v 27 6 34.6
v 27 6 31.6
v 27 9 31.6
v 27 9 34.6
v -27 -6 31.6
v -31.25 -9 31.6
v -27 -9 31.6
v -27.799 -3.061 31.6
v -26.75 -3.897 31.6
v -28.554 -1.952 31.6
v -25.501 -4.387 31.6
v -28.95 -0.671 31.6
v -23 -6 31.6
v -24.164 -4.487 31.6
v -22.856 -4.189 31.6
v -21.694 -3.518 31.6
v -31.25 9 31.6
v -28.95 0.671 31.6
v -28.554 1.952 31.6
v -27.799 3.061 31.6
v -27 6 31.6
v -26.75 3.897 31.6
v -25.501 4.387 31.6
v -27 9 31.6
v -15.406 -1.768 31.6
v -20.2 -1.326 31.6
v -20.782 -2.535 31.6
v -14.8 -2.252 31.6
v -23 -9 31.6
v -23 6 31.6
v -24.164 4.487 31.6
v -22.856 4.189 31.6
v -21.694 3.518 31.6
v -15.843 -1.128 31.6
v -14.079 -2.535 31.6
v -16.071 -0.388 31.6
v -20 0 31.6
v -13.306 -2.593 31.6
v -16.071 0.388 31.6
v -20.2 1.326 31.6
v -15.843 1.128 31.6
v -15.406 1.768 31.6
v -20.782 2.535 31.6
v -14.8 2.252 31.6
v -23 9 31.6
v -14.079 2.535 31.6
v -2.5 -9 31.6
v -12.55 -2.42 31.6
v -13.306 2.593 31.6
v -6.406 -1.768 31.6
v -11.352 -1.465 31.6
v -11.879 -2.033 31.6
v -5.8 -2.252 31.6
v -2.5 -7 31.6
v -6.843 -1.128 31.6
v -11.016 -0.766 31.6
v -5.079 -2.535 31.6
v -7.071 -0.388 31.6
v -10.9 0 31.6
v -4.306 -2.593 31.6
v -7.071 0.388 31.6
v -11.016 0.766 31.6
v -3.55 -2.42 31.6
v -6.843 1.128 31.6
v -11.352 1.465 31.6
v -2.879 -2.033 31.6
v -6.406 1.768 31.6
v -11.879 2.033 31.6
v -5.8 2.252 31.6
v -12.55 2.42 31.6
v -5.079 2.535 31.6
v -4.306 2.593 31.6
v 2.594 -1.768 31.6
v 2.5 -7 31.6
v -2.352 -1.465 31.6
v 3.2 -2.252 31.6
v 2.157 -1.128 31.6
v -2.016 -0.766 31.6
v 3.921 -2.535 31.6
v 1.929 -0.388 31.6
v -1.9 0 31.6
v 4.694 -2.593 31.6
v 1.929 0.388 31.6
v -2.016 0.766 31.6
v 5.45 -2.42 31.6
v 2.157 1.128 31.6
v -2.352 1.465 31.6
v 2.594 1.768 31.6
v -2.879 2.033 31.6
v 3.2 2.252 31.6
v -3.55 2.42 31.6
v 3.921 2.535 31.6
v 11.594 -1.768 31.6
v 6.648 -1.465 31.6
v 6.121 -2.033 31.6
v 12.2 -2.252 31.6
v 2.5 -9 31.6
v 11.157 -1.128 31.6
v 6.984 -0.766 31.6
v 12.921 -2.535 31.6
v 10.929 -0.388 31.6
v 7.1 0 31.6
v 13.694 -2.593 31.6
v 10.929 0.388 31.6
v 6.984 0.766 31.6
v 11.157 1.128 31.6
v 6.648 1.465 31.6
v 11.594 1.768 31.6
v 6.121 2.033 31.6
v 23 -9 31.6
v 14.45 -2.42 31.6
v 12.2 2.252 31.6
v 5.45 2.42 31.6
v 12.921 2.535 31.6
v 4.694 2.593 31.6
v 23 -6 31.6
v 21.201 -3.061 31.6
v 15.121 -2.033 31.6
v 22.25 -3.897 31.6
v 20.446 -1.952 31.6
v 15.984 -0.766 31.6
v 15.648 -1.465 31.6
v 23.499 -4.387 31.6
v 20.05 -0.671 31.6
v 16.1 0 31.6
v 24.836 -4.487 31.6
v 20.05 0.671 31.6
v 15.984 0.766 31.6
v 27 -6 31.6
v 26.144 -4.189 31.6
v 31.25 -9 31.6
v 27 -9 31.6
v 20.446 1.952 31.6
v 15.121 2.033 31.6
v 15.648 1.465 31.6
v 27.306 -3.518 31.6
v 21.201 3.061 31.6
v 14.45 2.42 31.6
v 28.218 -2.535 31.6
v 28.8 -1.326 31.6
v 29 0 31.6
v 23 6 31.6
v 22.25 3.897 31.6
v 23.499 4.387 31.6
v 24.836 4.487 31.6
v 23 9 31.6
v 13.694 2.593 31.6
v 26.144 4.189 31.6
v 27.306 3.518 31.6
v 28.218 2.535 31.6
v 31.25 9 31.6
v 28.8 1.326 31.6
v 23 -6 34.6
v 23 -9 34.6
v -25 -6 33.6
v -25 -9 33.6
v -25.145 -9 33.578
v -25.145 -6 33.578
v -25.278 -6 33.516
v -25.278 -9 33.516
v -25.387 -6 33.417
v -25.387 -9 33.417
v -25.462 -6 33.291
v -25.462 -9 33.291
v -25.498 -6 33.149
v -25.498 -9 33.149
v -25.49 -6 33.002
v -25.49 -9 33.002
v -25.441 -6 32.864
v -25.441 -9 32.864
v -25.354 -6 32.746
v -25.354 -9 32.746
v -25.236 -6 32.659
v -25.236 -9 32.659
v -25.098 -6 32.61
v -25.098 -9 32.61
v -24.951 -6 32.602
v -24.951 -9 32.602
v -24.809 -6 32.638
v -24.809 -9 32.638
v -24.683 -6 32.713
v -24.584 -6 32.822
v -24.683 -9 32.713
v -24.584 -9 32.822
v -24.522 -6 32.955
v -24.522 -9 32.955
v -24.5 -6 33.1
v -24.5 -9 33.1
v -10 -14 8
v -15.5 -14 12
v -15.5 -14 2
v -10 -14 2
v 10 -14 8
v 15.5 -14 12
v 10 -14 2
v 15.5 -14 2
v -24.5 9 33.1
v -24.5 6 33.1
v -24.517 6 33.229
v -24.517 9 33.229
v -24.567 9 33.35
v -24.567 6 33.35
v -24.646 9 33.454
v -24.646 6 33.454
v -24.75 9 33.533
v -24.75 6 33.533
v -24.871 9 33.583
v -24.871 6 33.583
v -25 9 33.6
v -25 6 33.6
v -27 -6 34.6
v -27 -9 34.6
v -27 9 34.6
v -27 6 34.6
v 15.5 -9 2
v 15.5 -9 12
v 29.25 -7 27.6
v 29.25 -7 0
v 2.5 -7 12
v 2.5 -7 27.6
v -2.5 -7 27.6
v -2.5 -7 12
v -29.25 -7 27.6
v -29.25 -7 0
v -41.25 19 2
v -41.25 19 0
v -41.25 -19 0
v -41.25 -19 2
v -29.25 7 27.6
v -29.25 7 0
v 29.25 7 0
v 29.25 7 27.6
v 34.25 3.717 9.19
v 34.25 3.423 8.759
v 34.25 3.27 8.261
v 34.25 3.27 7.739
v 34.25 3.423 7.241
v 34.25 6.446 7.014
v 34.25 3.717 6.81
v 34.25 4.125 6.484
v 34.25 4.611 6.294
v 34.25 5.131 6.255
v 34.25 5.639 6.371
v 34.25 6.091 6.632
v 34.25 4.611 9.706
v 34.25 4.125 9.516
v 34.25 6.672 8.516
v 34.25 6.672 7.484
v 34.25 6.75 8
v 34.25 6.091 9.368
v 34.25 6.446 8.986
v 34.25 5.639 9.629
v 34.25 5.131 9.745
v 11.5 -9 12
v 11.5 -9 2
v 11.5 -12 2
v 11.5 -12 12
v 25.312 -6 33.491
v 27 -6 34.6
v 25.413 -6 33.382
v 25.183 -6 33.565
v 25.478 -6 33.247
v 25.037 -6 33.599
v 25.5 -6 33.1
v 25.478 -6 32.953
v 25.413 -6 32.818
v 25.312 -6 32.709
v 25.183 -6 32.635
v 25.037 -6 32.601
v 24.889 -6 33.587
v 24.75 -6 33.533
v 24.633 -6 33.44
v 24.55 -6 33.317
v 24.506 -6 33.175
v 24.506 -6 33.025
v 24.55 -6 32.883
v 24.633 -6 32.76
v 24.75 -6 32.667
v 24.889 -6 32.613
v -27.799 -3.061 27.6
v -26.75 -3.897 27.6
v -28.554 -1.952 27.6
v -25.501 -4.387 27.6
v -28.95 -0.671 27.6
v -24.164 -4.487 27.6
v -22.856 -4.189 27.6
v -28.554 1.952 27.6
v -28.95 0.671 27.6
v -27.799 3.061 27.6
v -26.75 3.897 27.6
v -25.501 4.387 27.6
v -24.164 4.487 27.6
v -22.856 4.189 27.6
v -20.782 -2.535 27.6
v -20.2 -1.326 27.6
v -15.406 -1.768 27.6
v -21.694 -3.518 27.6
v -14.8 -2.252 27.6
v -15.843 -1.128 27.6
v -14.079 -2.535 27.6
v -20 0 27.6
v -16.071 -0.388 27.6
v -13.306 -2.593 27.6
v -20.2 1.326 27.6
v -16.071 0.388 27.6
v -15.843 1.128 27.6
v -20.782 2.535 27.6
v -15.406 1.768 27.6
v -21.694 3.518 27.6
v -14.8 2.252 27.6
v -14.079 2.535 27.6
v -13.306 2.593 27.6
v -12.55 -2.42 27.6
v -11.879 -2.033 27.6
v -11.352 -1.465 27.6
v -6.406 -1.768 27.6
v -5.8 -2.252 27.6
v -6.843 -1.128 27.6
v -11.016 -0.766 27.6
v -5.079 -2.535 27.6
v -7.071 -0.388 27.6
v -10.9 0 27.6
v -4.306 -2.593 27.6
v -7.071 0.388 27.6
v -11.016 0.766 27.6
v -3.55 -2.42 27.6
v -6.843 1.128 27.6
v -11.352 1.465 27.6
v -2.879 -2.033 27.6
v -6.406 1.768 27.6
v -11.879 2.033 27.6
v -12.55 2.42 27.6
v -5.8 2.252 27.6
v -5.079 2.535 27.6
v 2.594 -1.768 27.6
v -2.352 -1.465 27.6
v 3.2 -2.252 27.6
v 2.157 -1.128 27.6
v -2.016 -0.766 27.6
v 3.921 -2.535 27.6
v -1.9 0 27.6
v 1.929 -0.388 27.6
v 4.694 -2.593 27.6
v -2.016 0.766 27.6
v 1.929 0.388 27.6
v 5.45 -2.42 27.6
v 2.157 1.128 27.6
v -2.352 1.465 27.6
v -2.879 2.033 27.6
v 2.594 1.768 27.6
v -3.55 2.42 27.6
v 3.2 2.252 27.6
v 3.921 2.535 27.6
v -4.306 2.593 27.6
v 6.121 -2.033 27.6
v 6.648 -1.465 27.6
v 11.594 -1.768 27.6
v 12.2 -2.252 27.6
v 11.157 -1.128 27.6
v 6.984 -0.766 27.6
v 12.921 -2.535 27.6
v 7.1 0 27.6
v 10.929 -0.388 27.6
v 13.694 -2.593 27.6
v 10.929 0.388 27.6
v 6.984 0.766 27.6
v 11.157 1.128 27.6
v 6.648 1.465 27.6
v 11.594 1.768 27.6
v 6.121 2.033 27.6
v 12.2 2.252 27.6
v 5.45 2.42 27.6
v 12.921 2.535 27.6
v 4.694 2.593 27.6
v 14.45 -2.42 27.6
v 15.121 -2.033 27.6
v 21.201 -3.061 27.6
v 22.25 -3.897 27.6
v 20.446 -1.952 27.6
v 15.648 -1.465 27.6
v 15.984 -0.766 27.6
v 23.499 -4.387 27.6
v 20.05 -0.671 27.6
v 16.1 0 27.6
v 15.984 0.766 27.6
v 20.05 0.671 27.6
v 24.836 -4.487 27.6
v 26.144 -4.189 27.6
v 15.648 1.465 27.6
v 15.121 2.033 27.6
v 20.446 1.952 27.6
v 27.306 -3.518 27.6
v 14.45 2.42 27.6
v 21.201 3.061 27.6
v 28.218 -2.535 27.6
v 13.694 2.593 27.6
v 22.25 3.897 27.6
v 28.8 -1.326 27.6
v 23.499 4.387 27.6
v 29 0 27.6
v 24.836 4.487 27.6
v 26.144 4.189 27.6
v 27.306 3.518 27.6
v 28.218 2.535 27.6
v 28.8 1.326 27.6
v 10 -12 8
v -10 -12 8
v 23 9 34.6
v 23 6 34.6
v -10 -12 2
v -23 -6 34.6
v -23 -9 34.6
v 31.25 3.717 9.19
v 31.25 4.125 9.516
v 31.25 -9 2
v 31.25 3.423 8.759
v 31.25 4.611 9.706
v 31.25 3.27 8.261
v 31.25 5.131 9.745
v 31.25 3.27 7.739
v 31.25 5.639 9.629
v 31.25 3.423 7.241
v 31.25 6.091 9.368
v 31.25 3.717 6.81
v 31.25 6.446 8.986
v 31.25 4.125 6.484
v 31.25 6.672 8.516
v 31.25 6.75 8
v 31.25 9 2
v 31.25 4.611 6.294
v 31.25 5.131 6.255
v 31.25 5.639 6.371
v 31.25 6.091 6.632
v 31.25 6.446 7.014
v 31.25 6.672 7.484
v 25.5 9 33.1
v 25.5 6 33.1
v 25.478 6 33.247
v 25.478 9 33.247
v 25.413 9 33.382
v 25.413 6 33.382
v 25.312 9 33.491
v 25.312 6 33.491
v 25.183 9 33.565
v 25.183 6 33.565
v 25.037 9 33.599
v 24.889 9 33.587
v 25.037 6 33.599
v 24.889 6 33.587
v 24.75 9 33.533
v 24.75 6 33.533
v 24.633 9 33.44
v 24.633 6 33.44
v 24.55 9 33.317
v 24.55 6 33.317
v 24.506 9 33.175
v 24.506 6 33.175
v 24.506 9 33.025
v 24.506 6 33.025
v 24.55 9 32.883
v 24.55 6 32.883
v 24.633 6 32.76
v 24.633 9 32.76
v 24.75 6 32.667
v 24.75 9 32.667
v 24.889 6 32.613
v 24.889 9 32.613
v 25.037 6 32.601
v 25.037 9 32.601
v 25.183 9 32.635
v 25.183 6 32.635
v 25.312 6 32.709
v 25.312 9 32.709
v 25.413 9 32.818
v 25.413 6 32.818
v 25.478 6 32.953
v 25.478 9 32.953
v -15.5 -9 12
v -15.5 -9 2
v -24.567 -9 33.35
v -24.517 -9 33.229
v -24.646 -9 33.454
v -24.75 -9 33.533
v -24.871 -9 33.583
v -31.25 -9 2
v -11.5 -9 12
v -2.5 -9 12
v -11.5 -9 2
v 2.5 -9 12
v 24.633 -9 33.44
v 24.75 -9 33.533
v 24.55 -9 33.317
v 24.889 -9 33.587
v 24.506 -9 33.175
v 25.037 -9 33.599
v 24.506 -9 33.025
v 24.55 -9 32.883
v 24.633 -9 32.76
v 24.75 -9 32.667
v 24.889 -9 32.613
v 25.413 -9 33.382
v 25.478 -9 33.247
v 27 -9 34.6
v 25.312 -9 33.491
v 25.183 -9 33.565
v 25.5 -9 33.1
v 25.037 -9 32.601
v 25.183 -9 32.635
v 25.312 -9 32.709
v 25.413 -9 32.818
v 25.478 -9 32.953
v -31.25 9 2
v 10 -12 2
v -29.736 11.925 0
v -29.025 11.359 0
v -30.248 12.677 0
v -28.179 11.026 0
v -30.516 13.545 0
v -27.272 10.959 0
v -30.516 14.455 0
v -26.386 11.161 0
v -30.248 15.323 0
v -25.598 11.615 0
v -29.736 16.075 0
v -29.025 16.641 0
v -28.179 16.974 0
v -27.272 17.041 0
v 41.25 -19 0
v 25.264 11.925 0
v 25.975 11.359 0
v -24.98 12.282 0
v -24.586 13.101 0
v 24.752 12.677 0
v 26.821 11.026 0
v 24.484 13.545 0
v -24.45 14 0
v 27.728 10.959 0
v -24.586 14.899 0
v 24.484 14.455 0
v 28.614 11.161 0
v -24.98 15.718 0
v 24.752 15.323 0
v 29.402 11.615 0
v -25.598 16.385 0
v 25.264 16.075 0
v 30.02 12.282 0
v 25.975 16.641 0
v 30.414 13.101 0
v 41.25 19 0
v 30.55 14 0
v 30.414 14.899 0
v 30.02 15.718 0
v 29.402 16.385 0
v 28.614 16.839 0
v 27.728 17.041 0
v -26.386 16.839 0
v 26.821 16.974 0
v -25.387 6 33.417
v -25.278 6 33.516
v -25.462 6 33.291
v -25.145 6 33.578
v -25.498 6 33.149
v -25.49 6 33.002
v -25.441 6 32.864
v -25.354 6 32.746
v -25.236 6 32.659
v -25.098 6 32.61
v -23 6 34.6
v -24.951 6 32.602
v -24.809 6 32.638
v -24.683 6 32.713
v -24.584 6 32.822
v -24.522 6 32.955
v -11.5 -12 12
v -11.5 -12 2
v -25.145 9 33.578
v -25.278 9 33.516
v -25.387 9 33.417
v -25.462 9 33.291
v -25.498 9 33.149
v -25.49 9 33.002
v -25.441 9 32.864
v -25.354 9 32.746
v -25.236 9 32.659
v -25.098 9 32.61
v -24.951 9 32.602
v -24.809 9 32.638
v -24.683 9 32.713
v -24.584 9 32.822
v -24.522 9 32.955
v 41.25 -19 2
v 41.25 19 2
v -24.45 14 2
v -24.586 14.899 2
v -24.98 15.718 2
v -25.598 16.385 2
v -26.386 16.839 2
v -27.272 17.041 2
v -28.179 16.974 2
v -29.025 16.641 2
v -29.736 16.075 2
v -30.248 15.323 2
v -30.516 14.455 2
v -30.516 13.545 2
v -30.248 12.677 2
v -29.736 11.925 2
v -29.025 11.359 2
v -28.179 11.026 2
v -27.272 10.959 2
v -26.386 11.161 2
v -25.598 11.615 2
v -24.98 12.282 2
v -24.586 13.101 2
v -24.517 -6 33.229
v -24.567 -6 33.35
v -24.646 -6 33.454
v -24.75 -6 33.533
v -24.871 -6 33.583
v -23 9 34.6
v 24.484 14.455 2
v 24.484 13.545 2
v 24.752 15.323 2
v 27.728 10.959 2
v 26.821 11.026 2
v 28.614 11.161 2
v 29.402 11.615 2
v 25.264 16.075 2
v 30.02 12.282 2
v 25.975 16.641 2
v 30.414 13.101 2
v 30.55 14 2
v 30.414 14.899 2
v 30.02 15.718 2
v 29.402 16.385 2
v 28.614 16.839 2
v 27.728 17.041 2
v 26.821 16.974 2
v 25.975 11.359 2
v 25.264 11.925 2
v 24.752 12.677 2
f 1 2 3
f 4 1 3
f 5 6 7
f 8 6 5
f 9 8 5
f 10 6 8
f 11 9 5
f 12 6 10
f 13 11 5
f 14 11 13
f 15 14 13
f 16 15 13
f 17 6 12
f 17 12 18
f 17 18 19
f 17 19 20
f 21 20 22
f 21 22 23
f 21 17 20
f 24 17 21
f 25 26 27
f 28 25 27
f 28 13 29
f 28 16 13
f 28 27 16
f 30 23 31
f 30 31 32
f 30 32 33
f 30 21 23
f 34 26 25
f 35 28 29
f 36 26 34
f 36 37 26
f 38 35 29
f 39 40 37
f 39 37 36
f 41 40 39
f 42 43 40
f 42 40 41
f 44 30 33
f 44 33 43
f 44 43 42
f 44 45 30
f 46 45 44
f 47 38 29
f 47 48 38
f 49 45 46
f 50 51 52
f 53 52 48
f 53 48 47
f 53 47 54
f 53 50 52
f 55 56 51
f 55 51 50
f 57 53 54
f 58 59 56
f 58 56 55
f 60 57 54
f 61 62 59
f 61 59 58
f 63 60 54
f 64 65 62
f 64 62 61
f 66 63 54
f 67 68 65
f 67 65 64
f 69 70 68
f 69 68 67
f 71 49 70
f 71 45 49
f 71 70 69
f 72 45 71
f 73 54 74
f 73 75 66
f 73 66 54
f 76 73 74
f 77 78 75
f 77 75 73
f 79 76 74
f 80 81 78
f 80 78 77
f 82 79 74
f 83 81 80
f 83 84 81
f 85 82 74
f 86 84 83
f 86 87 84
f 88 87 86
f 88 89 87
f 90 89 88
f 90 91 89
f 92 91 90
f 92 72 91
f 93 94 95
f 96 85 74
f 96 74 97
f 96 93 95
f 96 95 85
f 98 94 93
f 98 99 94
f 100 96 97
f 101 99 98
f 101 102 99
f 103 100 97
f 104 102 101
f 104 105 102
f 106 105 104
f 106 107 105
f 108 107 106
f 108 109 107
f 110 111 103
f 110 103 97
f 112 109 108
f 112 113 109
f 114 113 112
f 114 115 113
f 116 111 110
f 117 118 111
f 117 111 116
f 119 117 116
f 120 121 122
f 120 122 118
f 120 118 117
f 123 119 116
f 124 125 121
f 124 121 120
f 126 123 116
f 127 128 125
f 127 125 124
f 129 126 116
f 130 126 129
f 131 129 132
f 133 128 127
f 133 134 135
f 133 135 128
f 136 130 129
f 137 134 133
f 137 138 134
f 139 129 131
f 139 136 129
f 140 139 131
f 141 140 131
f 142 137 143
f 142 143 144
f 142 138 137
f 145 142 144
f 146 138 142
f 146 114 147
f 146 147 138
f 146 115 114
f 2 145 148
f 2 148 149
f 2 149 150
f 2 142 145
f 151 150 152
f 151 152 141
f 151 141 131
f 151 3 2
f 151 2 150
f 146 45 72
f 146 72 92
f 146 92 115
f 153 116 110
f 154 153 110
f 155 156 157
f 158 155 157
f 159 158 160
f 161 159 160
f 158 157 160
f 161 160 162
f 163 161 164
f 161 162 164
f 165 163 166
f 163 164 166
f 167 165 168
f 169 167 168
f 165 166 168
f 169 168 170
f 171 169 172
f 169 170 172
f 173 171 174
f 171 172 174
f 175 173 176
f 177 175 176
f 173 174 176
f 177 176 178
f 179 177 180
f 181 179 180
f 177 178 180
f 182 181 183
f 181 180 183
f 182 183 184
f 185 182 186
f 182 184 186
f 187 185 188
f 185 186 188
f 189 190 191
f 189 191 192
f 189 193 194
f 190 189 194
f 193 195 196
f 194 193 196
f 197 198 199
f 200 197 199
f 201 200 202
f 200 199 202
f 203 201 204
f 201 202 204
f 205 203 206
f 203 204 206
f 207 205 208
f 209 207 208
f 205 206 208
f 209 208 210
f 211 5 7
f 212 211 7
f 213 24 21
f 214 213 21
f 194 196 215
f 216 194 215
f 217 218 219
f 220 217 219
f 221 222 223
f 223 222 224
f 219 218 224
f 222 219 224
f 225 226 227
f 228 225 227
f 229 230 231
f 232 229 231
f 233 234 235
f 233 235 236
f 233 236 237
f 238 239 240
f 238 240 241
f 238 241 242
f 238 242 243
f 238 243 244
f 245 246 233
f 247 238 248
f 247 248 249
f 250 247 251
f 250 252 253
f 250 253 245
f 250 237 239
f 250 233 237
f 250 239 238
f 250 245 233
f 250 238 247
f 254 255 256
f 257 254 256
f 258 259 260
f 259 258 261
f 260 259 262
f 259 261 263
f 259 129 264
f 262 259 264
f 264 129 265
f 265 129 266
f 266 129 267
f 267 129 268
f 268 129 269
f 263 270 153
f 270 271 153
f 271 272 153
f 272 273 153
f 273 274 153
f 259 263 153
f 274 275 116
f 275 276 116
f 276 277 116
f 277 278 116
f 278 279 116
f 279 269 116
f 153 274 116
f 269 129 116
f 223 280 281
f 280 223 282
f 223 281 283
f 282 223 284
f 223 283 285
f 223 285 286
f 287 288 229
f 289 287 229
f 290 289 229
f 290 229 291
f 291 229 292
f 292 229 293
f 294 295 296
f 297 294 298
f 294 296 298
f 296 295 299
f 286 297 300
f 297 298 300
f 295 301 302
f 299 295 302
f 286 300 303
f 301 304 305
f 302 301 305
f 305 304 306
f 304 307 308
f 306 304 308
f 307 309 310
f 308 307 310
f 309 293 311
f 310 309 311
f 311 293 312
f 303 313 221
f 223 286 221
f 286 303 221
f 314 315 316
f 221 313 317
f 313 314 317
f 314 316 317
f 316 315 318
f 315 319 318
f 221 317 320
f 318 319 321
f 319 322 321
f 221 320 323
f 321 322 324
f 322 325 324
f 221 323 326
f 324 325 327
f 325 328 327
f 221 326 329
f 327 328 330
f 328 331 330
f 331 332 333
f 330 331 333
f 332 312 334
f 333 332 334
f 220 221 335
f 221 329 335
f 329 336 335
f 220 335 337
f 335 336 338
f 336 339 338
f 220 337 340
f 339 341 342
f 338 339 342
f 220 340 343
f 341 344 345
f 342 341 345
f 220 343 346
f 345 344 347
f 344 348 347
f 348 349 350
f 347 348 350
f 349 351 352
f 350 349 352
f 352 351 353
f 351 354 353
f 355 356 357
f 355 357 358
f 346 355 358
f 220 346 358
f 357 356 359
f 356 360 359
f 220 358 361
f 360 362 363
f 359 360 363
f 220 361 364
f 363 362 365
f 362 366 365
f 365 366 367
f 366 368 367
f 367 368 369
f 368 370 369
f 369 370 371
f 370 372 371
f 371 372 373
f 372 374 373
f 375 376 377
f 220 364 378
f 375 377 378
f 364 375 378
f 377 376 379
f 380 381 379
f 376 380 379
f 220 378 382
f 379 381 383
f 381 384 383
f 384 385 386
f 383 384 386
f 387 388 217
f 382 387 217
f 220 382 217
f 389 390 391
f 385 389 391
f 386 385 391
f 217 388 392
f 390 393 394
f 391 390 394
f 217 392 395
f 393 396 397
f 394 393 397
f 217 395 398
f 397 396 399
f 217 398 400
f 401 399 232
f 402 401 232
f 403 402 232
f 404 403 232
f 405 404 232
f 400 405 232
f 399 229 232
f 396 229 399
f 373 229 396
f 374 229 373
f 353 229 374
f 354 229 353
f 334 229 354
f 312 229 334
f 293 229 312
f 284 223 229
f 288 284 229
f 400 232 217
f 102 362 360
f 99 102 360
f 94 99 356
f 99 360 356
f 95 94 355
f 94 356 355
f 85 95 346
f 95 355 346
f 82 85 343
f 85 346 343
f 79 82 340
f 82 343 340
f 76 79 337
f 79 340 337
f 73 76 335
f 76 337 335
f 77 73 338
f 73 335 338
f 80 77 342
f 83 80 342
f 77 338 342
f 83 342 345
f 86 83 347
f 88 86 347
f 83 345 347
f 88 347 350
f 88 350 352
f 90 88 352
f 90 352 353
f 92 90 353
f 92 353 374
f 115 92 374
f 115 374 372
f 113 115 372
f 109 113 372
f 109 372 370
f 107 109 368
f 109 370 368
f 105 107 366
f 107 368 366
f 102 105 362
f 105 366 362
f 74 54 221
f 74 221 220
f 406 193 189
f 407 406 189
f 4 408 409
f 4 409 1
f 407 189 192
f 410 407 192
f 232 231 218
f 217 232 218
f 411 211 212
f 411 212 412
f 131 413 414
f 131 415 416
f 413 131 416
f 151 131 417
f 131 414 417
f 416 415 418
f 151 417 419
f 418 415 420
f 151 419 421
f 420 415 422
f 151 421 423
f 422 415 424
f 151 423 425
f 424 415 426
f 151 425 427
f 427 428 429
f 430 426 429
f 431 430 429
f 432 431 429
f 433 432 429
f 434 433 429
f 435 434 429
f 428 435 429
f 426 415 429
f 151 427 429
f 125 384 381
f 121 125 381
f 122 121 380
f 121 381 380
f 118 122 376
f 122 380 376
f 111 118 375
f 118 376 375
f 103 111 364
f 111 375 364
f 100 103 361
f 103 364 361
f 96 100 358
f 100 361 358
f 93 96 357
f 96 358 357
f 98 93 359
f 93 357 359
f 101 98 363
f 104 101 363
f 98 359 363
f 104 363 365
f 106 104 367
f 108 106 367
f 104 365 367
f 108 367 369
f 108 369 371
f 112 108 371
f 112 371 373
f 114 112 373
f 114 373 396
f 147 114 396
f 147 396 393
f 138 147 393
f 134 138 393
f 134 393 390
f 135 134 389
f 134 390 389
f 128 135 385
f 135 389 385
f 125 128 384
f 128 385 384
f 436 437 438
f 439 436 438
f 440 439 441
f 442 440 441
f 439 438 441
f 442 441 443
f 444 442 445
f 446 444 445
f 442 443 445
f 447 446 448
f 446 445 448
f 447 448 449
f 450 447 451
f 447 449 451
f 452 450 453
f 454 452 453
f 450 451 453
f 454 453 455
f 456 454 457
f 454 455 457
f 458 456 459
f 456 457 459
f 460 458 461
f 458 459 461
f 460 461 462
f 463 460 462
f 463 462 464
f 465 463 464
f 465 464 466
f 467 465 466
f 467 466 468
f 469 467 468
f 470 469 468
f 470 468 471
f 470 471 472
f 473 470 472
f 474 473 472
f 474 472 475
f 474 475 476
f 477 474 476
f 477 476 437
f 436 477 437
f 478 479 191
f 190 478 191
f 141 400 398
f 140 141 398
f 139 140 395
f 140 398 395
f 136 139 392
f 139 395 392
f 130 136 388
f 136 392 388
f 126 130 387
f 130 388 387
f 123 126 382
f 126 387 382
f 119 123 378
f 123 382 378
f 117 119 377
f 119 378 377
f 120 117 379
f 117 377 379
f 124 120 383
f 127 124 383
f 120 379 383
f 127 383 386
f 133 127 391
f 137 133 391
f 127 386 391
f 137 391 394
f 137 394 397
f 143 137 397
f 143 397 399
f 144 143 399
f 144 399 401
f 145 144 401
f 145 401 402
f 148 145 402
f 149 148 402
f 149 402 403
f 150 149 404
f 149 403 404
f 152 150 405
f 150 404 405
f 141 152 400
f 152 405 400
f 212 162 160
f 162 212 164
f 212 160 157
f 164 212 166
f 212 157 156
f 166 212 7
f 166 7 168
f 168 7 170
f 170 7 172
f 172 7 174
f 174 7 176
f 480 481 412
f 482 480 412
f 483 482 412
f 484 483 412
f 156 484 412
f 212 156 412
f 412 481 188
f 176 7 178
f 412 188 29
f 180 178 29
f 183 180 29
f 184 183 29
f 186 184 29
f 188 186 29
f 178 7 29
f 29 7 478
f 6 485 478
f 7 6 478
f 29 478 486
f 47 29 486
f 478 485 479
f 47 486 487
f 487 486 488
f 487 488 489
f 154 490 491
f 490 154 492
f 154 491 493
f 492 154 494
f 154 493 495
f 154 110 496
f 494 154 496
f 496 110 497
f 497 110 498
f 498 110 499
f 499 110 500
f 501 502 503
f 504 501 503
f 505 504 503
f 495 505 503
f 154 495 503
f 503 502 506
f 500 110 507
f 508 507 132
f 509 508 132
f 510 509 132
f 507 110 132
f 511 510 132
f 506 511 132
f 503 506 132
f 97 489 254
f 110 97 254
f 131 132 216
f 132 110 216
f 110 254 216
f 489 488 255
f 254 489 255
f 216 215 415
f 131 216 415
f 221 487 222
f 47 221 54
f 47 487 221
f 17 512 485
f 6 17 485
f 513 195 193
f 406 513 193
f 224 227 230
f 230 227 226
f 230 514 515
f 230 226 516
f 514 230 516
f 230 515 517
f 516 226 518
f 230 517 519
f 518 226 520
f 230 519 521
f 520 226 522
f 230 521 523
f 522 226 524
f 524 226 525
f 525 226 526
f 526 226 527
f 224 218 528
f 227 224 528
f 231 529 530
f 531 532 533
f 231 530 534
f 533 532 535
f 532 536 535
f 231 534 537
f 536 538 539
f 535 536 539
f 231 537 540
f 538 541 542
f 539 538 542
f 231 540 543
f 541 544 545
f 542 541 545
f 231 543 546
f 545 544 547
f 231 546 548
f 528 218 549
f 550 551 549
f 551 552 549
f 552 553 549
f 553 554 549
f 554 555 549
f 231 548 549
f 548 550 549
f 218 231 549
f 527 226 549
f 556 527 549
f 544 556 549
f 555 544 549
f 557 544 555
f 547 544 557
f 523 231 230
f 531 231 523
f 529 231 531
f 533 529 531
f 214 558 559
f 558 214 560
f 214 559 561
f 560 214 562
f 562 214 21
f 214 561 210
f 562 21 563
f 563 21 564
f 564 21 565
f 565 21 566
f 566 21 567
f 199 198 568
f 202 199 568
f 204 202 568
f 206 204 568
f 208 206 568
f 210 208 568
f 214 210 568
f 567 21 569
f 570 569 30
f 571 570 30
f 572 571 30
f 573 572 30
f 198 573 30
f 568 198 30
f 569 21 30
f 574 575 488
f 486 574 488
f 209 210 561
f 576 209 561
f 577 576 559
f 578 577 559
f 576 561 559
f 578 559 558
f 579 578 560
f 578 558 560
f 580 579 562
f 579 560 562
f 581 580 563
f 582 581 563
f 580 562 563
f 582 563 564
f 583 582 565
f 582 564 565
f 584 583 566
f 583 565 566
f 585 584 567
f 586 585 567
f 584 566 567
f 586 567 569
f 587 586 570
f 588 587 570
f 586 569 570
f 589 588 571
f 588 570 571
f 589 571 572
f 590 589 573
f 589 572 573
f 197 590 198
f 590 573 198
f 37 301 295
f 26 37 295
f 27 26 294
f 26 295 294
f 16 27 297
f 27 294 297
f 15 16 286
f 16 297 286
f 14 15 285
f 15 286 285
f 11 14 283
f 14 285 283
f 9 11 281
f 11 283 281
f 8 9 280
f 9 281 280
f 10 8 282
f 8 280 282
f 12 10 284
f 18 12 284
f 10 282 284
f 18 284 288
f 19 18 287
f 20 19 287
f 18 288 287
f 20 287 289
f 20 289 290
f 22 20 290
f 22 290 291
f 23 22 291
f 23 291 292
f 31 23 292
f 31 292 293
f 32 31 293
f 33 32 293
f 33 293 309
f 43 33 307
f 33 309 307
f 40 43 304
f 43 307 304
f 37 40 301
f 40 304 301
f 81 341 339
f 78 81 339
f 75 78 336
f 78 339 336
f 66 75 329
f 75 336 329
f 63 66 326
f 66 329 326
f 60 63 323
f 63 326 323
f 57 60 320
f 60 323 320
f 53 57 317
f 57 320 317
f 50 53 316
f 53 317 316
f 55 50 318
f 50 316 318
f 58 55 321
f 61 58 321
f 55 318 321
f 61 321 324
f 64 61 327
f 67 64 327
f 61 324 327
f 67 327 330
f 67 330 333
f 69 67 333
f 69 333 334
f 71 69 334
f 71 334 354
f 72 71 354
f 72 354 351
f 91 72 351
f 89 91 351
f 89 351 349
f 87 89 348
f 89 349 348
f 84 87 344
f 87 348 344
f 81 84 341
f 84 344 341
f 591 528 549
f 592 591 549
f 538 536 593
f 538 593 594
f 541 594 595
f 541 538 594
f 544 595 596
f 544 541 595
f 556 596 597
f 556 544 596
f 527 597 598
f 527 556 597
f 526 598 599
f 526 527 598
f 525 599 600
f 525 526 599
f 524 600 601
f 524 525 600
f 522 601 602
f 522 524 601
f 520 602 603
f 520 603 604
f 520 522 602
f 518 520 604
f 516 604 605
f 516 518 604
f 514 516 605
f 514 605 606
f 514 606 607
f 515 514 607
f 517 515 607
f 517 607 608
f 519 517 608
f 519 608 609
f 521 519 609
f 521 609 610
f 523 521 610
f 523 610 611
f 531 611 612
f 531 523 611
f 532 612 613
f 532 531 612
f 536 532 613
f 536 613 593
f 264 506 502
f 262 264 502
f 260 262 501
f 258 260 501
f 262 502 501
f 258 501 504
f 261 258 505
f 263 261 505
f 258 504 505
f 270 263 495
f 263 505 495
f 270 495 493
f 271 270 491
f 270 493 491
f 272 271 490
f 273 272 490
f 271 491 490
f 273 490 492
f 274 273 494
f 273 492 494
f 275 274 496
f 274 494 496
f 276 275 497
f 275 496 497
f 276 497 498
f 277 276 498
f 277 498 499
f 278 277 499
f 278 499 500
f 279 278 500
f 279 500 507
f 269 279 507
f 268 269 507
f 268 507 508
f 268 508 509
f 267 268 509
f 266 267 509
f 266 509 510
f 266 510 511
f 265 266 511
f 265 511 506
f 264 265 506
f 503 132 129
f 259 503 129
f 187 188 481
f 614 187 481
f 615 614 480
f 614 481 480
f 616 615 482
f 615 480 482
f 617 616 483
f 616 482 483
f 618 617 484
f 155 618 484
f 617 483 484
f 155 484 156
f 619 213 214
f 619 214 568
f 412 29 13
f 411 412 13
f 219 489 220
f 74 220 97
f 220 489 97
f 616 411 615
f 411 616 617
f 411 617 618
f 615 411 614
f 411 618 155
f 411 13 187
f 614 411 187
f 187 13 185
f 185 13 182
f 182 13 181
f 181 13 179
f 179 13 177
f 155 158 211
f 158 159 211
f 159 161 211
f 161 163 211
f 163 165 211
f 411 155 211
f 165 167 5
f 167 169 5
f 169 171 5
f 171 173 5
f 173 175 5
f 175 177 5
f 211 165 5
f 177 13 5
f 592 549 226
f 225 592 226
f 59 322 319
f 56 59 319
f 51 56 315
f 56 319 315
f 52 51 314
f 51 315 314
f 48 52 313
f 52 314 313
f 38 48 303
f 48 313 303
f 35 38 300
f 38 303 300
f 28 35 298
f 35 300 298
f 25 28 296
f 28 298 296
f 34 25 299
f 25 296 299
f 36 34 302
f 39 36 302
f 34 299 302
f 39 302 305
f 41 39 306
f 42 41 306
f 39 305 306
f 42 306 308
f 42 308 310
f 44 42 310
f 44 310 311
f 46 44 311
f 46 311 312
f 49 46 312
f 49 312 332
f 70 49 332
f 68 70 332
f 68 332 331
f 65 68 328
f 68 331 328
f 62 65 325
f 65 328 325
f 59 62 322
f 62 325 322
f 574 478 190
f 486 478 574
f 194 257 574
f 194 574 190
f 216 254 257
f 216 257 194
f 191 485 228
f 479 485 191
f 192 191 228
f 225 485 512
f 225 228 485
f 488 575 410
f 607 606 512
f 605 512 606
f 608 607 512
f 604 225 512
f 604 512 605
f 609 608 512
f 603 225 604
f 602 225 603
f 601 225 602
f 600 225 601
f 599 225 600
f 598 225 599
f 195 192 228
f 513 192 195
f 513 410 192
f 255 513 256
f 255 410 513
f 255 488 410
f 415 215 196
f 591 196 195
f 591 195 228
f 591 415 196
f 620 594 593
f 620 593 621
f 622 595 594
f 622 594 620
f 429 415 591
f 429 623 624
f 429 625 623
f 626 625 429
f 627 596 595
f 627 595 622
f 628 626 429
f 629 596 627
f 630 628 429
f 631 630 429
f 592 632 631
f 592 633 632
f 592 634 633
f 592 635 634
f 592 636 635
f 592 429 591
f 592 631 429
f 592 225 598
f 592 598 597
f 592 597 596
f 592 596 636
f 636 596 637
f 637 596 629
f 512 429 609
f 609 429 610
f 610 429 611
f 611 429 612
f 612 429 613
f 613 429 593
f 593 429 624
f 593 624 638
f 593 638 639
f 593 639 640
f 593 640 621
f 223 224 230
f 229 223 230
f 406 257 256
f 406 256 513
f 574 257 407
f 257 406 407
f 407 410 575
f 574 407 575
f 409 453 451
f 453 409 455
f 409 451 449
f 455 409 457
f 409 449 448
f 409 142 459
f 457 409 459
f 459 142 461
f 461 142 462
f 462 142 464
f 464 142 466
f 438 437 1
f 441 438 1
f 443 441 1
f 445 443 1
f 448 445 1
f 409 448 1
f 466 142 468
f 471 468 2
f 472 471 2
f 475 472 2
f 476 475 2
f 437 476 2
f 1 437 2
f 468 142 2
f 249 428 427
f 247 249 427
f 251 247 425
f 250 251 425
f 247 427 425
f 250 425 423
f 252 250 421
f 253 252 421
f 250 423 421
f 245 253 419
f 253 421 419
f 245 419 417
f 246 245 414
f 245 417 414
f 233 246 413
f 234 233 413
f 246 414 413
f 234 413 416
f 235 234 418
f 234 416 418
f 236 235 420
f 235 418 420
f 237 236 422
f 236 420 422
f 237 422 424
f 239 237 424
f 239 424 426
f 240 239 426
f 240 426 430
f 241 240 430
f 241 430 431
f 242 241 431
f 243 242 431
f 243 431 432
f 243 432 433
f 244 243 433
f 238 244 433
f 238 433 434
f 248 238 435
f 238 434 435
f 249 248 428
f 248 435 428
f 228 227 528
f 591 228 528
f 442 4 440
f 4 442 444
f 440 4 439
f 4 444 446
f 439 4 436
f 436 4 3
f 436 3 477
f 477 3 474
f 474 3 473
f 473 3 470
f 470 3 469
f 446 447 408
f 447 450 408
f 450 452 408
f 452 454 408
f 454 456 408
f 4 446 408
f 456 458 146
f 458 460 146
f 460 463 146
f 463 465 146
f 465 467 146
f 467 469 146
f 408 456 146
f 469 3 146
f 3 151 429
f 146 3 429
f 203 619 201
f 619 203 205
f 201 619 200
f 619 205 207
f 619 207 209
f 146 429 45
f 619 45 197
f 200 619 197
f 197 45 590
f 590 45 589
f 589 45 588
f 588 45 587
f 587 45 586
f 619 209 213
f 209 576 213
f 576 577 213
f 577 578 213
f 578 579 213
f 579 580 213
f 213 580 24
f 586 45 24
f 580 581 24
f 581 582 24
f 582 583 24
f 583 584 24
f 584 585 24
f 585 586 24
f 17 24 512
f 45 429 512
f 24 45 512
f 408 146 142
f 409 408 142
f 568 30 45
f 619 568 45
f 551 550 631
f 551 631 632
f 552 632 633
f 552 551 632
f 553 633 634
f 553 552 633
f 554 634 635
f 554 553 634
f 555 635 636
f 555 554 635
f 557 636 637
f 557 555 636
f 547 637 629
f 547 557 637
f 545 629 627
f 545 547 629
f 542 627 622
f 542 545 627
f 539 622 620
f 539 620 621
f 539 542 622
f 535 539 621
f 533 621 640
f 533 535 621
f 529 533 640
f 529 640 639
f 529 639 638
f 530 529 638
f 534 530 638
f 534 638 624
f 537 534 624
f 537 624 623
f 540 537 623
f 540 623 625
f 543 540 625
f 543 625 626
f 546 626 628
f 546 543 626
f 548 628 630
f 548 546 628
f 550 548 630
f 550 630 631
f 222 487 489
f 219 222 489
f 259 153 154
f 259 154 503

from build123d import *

# Parameters (mm, degrees)
F1_DEPTH  = 31.6
F2_START  = 27.6
F2_DEPTH  = 4
F0_R      = 3.05
F3_DEPTH  = 2
F4_W      = 2.5
F4_H      = 19.6
F5_DEPTH  = 2
F7_DEPTH  = 3
F8_R      = 0.5
F9_DEPTH  = 25
F10_R     = 1.75
F11_DEPTH = 3
F13_DEPTH = 10
F15_DEPTH = 4


# Not quite as in the source:
# - a feature names something its author has since deleted; it is built from what else it names


with BuildPart() as f1:
    # F0 (on Top) → F1 (new body)
    with BuildSketch(Plane.XY):
        Polygon((31.25, -9), (31.25, 0), (29.25, 0), (29.25, -7), (-29.25, -7), (-29.25, 0), (-31.25, 0), (-31.25, -9), align=None)
        Polygon((31.25, 0), (31.25, 9), (-31.25, 9), (-31.25, 0), (-29.25, 0), (-29.25, 7), (29.25, 7), (29.25, 0), align=None)
    extrude(amount=F1_DEPTH)

    # F0 (on Top) → F2 (join)
    with BuildSketch(Plane.XY.offset(F2_START)):
        with BuildLine():
            Line((29, 0), (29.25, 0))
            Line((29.25, 0), (29.25, 7))
            Line((29.25, 7), (-29.25, 7))
            Line((-29.25, 7), (-29.25, 0))
            Line((-29.25, 0), (-29, 0))
            ThreePointArc((-29, 0), (-24.5, 4.5), (-20, 0))
            Line((-20, 0), (-16.1, 0))
            ThreePointArc((-16.1, 0), (-13.5, 2.6), (-10.9, 0))
            Line((-10.9, 0), (-7.1, 0))
            ThreePointArc((-7.1, 0), (-4.5, 2.6), (-1.9, 0))
            Line((-1.9, 0), (0, 0))
            Line((0, 0), (1.9, 0))
            ThreePointArc((1.9, 0), (4.5, 2.6), (7.1, 0))
            Line((7.1, 0), (10.9, 0))
            ThreePointArc((10.9, 0), (13.5, 2.6), (16.1, 0))
            Line((16.1, 0), (20, 0))
            ThreePointArc((20, 0), (24.5, 4.5), (29, 0))
        make_face()
        with BuildLine():
            Line((29.25, -7), (29.25, 0))
            Line((29.25, 0), (29, 0))
            ThreePointArc((29, 0), (24.5, -4.5), (20, 0))
            Line((20, 0), (16.1, 0))
            ThreePointArc((16.1, 0), (13.5, -2.6), (10.9, 0))
            Line((10.9, 0), (7.1, 0))
            ThreePointArc((7.1, 0), (4.5, -2.6), (1.9, 0))
            Line((1.9, 0), (0, 0))
            Line((0, 0), (-1.9, 0))
            ThreePointArc((-1.9, 0), (-4.5, -2.6), (-7.1, 0))
            Line((-7.1, 0), (-10.9, 0))
            ThreePointArc((-10.9, 0), (-13.5, -2.6), (-16.1, 0))
            Line((-16.1, 0), (-20, 0))
            ThreePointArc((-20, 0), (-24.5, -4.5), (-29, 0))
            Line((-29, 0), (-29.25, 0))
            Line((-29.25, 0), (-29.25, -7))
            Line((-29.25, -7), (29.25, -7))
        make_face()
    extrude(amount=F2_DEPTH)

    # F0 (on Top) → F3 (join)
    with BuildSketch(Plane.XY):
        Polygon((-41.25, 19), (-41.25, 14), (-41.25, -19), (41.25, -19), (41.25, 19), align=None)
        with Locations((-27.5, 14)):
            Circle(F0_R, mode=Mode.SUBTRACT)
        Polygon((-31.25, 9), (31.25, 9), (31.25, 0), (31.25, -9), (-31.25, -9), (-31.25, 0), align=None, mode=Mode.SUBTRACT)
        with Locations((27.5, 14)):
            Circle(F0_R, mode=Mode.SUBTRACT)
    extrude(amount=F3_DEPTH)

    # F4 (on face) → F5 (cut)
    with BuildSketch(Plane.XZ.offset(9)):
        with Locations((-1.25, 21.8)):
            Rectangle(F4_W, F4_H)
        with Locations((1.25, 21.8)):
            Rectangle(F4_W, F4_H)
    extrude(amount=-F5_DEPTH, mode=Mode.SUBTRACT)

    # F6 (on face) → F7 (join)
    with BuildSketch(Plane.XY.offset(31.6)):
        Polygon((-27, -6), (-27, -9), (-25, -9), (-23, -9), (-23, -6), (-25, -6), align=None)
        Polygon((23, -6), (23, -9), (25, -9), (27, -9), (27, -6), (25, -6), align=None)
        Polygon((-23, 6), (-23, 9), (-25, 9), (-27, 9), (-27, 6), (-25, 6), align=None)
        Polygon((25, 6), (27, 6), (27, 9), (25, 9), (23, 9), (23, 6), align=None)
    extrude(amount=F7_DEPTH)

    # F8 (on face) → F9 (cut)
    with BuildSketch(Plane.XZ.offset(9)):
        with BuildLine():
            ThreePointArc((-25, 33.6), (-25.3535533906, 32.7464466094), (-24.5, 33.1))
            ThreePointArc((-24.5, 33.1), (-24.6464466094, 33.4535533906), (-25, 33.6))
        make_face()
        with Locations((25, 33.1)):
            Circle(F8_R)
    extrude(amount=-F9_DEPTH, mode=Mode.SUBTRACT)

    # F10 (on face) → F11 (join)
    with BuildSketch(Plane.YZ.offset(31.25)):
        with Locations((5, 8)):
            Circle(F10_R)
    extrude(amount=F11_DEPTH)

    # F12 (on face) → F13 (join)
    with BuildSketch(Plane.XY.offset(2)):
        Polygon((-11.5, -9), (-15.5, -9), (-15.5, -11), (-15.5, -14), (0, -14), (15.5, -14), (15.5, -11), (15.5, -9), (11.5, -9), (11.5, -12), (0, -12), (-11.5, -12), align=None)
    extrude(amount=F13_DEPTH)

    # F14 (on face) → F15 (cut)
    with BuildSketch(Plane.XZ.offset(14)):
        Polygon((-10, 2), (0, 2), (10, 2), (10, 8), (0, 8), (-10, 8), align=None)
    extrude(amount=-F15_DEPTH, mode=Mode.SUBTRACT)


solid = f1.part
